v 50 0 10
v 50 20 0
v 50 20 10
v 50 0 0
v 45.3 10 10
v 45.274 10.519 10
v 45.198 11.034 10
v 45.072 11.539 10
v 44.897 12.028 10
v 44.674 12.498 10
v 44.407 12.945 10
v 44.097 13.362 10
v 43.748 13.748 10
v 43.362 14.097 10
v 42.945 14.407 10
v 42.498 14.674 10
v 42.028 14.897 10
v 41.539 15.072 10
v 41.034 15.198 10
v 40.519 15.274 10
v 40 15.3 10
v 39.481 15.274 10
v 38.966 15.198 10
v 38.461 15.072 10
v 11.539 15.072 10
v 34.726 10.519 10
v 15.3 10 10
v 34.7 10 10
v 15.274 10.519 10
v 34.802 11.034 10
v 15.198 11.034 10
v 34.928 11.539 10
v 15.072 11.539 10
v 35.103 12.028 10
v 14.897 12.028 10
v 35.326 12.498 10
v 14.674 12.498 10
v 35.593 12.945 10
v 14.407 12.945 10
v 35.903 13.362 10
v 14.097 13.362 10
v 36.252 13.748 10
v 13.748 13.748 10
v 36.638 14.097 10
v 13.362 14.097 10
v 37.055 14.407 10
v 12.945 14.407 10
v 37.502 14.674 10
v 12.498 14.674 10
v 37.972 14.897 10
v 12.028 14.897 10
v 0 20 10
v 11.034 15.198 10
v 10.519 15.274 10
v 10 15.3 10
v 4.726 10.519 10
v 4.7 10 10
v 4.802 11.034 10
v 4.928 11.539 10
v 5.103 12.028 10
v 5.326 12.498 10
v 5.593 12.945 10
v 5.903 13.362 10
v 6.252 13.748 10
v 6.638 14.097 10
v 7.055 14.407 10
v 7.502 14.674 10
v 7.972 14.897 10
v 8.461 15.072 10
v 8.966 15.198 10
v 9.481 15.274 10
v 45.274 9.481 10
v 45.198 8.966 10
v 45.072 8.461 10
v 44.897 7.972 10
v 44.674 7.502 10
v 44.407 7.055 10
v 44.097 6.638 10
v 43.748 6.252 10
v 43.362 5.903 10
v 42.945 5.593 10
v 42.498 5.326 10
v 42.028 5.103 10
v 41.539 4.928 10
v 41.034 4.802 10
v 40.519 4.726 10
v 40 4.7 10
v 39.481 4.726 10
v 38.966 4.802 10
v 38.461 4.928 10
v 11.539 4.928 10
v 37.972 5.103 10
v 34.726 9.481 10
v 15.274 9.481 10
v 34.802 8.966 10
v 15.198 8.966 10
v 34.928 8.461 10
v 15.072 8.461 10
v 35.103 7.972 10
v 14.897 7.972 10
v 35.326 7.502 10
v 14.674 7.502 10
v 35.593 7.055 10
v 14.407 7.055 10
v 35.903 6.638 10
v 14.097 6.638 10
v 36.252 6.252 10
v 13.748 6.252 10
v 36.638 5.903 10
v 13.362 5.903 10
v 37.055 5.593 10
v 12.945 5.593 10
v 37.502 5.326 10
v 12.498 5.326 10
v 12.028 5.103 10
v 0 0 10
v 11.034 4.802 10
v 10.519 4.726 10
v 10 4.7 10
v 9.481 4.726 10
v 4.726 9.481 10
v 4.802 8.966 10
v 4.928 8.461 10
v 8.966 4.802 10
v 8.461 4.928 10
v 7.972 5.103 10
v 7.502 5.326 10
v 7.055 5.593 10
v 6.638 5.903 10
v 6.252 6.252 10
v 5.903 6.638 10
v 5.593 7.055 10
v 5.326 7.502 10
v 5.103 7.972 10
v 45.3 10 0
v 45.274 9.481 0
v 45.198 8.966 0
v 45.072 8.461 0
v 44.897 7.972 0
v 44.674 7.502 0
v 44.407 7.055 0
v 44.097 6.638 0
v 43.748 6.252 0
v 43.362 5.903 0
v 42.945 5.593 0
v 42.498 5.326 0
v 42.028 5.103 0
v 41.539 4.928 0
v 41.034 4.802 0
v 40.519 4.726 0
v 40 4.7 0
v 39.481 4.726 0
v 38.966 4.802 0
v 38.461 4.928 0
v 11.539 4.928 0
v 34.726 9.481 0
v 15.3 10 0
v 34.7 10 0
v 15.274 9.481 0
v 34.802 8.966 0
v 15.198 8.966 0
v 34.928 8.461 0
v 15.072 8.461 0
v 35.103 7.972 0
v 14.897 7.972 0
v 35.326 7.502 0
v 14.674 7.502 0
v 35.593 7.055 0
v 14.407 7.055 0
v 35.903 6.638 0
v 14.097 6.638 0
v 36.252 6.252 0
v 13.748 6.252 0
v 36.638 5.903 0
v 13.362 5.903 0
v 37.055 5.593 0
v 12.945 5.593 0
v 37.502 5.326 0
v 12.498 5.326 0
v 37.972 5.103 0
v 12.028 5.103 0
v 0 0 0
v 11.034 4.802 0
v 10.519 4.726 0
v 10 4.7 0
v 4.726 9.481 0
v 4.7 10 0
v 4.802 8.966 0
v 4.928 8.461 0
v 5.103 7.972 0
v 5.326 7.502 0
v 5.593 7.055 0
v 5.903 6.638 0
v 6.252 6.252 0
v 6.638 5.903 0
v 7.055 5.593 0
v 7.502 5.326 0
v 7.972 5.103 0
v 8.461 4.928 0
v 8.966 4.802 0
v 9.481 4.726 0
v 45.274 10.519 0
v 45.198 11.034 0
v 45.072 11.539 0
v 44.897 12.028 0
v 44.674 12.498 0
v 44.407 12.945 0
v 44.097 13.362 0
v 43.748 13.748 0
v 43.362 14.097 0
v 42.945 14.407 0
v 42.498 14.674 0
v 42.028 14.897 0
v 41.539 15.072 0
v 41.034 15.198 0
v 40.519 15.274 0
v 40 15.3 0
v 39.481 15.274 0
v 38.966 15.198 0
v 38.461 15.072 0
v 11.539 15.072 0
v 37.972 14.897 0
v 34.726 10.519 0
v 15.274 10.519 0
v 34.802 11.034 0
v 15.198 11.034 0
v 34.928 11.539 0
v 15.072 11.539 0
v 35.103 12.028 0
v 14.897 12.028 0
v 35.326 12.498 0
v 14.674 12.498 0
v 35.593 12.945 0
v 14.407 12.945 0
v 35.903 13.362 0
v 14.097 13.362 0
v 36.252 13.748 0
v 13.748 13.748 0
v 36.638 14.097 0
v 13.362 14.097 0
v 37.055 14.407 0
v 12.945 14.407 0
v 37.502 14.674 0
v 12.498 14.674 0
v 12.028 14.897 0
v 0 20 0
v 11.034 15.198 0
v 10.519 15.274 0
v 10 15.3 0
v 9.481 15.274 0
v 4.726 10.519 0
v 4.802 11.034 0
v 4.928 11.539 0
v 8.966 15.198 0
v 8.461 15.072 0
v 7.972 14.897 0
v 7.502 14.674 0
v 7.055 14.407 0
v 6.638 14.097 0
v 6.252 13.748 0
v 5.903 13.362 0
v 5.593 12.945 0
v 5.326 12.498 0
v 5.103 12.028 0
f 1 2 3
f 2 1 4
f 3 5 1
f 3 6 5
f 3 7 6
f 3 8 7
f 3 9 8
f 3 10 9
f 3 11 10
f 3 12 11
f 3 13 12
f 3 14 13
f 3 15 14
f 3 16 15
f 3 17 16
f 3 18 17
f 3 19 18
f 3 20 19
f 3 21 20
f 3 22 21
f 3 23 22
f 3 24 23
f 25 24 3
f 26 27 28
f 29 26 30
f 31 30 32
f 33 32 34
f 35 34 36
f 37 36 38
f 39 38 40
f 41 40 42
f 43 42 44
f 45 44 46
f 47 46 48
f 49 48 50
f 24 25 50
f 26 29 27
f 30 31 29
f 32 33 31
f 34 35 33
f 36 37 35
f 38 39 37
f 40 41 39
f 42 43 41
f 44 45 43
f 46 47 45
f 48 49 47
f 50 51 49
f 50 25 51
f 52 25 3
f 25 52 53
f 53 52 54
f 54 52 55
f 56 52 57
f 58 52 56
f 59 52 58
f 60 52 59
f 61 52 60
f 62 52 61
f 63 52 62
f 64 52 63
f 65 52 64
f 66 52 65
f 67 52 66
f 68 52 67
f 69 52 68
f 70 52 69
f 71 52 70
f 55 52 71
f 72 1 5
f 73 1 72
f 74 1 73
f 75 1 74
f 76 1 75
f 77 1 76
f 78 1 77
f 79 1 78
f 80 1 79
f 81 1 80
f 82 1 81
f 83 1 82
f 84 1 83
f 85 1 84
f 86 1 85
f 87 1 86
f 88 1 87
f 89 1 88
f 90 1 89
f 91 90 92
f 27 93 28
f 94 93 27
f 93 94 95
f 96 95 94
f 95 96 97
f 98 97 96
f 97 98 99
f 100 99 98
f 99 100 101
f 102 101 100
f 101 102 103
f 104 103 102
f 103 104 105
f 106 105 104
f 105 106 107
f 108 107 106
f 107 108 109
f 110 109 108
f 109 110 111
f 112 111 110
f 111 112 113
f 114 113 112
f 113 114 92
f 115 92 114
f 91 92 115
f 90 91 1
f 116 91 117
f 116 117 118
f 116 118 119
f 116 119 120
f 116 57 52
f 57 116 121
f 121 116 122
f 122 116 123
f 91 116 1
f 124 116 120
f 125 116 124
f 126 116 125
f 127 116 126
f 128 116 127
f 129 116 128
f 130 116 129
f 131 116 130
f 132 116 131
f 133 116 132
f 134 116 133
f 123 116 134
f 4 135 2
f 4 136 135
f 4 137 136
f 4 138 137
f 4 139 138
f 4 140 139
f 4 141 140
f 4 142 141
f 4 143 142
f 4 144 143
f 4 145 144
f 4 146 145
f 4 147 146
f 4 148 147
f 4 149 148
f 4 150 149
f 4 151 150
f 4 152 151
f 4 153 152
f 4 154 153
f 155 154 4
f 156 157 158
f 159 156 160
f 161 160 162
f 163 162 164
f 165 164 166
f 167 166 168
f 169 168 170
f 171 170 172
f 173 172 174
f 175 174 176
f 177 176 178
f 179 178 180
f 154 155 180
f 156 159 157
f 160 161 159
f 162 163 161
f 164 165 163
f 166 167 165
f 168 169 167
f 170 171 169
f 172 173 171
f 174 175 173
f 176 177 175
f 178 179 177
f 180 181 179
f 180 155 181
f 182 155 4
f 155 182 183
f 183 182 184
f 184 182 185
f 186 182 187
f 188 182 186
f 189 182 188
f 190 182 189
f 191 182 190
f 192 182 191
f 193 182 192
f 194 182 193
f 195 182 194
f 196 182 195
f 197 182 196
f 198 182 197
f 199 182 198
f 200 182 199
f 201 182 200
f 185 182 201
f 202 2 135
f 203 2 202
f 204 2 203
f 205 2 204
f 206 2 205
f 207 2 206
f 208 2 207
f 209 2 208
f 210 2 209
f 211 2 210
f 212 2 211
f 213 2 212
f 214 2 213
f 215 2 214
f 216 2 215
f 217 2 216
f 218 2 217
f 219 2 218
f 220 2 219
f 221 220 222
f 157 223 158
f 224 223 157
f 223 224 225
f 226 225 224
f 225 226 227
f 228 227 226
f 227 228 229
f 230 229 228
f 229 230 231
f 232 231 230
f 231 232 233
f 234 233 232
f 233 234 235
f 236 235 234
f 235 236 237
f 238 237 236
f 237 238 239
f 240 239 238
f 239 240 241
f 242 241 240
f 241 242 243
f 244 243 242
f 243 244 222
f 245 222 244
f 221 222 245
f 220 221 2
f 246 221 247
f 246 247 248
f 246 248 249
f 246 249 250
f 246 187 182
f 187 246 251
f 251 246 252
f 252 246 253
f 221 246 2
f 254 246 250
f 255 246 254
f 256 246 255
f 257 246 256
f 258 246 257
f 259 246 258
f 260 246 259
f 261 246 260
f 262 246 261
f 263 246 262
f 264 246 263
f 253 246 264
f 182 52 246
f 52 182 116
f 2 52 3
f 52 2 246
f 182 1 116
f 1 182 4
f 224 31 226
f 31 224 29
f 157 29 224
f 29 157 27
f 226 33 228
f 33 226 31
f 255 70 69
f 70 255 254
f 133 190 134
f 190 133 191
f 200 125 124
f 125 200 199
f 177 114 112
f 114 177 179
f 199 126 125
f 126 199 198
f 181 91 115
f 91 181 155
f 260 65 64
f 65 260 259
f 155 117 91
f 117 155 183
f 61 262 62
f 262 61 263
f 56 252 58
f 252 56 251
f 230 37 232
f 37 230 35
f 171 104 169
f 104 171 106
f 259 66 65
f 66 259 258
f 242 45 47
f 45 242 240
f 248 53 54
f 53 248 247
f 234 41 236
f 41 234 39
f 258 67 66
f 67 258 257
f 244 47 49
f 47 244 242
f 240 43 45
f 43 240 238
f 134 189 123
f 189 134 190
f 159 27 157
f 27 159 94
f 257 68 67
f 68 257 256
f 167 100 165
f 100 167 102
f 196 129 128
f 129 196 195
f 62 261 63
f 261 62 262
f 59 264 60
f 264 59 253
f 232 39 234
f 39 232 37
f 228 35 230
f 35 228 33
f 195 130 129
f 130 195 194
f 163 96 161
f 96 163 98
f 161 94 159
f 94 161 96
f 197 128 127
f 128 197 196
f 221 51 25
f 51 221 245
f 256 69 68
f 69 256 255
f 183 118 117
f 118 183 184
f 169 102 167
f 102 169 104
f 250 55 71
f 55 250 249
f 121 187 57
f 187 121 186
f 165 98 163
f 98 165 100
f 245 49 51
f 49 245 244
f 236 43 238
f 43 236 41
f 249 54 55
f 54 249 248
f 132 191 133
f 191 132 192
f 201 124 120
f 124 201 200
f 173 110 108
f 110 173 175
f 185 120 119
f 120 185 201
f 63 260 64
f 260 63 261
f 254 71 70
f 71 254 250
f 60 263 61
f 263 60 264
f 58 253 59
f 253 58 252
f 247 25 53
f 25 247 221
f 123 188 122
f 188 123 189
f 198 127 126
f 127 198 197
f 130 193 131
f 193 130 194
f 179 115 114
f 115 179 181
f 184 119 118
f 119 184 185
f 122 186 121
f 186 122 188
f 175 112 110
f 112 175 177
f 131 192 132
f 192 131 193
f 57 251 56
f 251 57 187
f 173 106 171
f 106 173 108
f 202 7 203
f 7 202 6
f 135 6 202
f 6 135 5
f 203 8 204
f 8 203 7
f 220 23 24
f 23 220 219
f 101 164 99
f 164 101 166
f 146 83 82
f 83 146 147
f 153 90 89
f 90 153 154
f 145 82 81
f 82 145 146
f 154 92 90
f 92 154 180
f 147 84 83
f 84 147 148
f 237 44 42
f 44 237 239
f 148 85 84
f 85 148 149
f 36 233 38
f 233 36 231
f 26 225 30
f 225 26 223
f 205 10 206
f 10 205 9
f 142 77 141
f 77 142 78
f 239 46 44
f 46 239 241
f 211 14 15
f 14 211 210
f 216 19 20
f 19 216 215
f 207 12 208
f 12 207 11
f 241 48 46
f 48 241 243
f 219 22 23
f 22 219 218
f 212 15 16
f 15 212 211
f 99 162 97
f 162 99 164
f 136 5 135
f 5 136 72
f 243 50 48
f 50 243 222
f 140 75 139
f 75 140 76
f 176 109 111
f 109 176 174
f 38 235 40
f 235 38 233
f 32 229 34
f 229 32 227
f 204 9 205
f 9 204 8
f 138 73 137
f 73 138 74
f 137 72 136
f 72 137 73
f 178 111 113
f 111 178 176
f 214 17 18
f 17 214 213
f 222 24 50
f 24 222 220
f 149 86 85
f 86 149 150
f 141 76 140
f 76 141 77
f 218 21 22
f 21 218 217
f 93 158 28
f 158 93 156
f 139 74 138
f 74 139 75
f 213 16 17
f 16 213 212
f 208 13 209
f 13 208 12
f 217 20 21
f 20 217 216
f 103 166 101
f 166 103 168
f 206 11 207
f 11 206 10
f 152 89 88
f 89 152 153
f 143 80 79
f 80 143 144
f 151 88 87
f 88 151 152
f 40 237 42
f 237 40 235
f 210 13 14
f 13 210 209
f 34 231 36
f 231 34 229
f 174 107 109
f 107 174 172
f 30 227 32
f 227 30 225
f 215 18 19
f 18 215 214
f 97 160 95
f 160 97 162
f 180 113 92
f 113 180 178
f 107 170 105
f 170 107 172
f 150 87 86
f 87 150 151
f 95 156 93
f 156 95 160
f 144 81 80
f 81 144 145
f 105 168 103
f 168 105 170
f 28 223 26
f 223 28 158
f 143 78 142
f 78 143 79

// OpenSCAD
$fn = 64;

mm = 1;
cm = 10*mm;

pd = 0.3*mm;
axle_radius = 5*mm;
disc_radius = 15*mm;

// base

difference() {
  cube([5*cm, 2*cm, 1*cm]);

  translate([1*cm,1*cm,0])
  cylinder(r = axle_radius+pd, h = 10*cm, center = true);

  translate([4*cm,1*cm,0])
  cylinder(r = axle_radius+pd, h = 10*cm, center = true);
}

// base disc on axle

module base_axle() {
  cylinder(r = axle_radius, h = 9*mm, center = true);
}

module base_cylinder() {
  base_axle();

  translate([0,0,4.5*mm + 3*mm])
  cylinder(r = disc_radius, h = 6*mm, center = true);
}

// translate([1*cm,1*cm,6*mm])
// base_cylinder();

// slotted disc

slot_radius = 20*mm;
divisions = 9;
angle = 360/divisions;

module slot() {
  difference() {
    cylinder(r = slot_radius, h = 10*mm, center = true);
    cylinder(r = slot_radius - 2.2*mm, h = 10*cm, center = true);
  }
}

module slotted_disc() {
  difference() {
    base_cylinder();

    rotate([0,0,75])
    for (i=[0:divisions-1]) {
      rotate([0,0,i*angle])
      translate([
        disc_radius,
        0,
        4.5*mm + 6*mm + 5*mm - 3*mm
      ])
      rotate([0,0,-15])
      translate([0,-slot_radius,0])
      slot();
    }
  }
}

// translate([1*cm,1*cm,6*mm])
// slotted_disc();

// pusher disc

module pusher_disc() {
  base_axle();

  translate([0,0,4.5*mm + 3*mm]) {
    cylinder(r = axle_radius, h = 12*mm, center = true);

    difference() {
      union() {
        difference() {
          translate([-8*mm,0,3*mm])
          cylinder(r = slot_radius, h = 5*mm, center = true);

          translate([-8*mm,0,0])
          cylinder(r = slot_radius-1*mm, h = 10*cm, center = true);
        }

        translate([-8*mm,0,5*mm])
        cylinder(r = slot_radius, h = 2*mm, center = true);
      }

      translate([5*cm,0,0])
      cube([10*cm, 10*cm, 10*cm], center = true);

      translate([0,5.5*cm,0])
      cube([10*cm, 10*cm, 10*cm], center = true);

      translate([0,-5.5*cm,0])
      cube([10*cm, 10*cm, 10*cm], center = true);

    }
  }
}

// translate([4*cm,1*cm,6*mm])
// pusher_disc();
